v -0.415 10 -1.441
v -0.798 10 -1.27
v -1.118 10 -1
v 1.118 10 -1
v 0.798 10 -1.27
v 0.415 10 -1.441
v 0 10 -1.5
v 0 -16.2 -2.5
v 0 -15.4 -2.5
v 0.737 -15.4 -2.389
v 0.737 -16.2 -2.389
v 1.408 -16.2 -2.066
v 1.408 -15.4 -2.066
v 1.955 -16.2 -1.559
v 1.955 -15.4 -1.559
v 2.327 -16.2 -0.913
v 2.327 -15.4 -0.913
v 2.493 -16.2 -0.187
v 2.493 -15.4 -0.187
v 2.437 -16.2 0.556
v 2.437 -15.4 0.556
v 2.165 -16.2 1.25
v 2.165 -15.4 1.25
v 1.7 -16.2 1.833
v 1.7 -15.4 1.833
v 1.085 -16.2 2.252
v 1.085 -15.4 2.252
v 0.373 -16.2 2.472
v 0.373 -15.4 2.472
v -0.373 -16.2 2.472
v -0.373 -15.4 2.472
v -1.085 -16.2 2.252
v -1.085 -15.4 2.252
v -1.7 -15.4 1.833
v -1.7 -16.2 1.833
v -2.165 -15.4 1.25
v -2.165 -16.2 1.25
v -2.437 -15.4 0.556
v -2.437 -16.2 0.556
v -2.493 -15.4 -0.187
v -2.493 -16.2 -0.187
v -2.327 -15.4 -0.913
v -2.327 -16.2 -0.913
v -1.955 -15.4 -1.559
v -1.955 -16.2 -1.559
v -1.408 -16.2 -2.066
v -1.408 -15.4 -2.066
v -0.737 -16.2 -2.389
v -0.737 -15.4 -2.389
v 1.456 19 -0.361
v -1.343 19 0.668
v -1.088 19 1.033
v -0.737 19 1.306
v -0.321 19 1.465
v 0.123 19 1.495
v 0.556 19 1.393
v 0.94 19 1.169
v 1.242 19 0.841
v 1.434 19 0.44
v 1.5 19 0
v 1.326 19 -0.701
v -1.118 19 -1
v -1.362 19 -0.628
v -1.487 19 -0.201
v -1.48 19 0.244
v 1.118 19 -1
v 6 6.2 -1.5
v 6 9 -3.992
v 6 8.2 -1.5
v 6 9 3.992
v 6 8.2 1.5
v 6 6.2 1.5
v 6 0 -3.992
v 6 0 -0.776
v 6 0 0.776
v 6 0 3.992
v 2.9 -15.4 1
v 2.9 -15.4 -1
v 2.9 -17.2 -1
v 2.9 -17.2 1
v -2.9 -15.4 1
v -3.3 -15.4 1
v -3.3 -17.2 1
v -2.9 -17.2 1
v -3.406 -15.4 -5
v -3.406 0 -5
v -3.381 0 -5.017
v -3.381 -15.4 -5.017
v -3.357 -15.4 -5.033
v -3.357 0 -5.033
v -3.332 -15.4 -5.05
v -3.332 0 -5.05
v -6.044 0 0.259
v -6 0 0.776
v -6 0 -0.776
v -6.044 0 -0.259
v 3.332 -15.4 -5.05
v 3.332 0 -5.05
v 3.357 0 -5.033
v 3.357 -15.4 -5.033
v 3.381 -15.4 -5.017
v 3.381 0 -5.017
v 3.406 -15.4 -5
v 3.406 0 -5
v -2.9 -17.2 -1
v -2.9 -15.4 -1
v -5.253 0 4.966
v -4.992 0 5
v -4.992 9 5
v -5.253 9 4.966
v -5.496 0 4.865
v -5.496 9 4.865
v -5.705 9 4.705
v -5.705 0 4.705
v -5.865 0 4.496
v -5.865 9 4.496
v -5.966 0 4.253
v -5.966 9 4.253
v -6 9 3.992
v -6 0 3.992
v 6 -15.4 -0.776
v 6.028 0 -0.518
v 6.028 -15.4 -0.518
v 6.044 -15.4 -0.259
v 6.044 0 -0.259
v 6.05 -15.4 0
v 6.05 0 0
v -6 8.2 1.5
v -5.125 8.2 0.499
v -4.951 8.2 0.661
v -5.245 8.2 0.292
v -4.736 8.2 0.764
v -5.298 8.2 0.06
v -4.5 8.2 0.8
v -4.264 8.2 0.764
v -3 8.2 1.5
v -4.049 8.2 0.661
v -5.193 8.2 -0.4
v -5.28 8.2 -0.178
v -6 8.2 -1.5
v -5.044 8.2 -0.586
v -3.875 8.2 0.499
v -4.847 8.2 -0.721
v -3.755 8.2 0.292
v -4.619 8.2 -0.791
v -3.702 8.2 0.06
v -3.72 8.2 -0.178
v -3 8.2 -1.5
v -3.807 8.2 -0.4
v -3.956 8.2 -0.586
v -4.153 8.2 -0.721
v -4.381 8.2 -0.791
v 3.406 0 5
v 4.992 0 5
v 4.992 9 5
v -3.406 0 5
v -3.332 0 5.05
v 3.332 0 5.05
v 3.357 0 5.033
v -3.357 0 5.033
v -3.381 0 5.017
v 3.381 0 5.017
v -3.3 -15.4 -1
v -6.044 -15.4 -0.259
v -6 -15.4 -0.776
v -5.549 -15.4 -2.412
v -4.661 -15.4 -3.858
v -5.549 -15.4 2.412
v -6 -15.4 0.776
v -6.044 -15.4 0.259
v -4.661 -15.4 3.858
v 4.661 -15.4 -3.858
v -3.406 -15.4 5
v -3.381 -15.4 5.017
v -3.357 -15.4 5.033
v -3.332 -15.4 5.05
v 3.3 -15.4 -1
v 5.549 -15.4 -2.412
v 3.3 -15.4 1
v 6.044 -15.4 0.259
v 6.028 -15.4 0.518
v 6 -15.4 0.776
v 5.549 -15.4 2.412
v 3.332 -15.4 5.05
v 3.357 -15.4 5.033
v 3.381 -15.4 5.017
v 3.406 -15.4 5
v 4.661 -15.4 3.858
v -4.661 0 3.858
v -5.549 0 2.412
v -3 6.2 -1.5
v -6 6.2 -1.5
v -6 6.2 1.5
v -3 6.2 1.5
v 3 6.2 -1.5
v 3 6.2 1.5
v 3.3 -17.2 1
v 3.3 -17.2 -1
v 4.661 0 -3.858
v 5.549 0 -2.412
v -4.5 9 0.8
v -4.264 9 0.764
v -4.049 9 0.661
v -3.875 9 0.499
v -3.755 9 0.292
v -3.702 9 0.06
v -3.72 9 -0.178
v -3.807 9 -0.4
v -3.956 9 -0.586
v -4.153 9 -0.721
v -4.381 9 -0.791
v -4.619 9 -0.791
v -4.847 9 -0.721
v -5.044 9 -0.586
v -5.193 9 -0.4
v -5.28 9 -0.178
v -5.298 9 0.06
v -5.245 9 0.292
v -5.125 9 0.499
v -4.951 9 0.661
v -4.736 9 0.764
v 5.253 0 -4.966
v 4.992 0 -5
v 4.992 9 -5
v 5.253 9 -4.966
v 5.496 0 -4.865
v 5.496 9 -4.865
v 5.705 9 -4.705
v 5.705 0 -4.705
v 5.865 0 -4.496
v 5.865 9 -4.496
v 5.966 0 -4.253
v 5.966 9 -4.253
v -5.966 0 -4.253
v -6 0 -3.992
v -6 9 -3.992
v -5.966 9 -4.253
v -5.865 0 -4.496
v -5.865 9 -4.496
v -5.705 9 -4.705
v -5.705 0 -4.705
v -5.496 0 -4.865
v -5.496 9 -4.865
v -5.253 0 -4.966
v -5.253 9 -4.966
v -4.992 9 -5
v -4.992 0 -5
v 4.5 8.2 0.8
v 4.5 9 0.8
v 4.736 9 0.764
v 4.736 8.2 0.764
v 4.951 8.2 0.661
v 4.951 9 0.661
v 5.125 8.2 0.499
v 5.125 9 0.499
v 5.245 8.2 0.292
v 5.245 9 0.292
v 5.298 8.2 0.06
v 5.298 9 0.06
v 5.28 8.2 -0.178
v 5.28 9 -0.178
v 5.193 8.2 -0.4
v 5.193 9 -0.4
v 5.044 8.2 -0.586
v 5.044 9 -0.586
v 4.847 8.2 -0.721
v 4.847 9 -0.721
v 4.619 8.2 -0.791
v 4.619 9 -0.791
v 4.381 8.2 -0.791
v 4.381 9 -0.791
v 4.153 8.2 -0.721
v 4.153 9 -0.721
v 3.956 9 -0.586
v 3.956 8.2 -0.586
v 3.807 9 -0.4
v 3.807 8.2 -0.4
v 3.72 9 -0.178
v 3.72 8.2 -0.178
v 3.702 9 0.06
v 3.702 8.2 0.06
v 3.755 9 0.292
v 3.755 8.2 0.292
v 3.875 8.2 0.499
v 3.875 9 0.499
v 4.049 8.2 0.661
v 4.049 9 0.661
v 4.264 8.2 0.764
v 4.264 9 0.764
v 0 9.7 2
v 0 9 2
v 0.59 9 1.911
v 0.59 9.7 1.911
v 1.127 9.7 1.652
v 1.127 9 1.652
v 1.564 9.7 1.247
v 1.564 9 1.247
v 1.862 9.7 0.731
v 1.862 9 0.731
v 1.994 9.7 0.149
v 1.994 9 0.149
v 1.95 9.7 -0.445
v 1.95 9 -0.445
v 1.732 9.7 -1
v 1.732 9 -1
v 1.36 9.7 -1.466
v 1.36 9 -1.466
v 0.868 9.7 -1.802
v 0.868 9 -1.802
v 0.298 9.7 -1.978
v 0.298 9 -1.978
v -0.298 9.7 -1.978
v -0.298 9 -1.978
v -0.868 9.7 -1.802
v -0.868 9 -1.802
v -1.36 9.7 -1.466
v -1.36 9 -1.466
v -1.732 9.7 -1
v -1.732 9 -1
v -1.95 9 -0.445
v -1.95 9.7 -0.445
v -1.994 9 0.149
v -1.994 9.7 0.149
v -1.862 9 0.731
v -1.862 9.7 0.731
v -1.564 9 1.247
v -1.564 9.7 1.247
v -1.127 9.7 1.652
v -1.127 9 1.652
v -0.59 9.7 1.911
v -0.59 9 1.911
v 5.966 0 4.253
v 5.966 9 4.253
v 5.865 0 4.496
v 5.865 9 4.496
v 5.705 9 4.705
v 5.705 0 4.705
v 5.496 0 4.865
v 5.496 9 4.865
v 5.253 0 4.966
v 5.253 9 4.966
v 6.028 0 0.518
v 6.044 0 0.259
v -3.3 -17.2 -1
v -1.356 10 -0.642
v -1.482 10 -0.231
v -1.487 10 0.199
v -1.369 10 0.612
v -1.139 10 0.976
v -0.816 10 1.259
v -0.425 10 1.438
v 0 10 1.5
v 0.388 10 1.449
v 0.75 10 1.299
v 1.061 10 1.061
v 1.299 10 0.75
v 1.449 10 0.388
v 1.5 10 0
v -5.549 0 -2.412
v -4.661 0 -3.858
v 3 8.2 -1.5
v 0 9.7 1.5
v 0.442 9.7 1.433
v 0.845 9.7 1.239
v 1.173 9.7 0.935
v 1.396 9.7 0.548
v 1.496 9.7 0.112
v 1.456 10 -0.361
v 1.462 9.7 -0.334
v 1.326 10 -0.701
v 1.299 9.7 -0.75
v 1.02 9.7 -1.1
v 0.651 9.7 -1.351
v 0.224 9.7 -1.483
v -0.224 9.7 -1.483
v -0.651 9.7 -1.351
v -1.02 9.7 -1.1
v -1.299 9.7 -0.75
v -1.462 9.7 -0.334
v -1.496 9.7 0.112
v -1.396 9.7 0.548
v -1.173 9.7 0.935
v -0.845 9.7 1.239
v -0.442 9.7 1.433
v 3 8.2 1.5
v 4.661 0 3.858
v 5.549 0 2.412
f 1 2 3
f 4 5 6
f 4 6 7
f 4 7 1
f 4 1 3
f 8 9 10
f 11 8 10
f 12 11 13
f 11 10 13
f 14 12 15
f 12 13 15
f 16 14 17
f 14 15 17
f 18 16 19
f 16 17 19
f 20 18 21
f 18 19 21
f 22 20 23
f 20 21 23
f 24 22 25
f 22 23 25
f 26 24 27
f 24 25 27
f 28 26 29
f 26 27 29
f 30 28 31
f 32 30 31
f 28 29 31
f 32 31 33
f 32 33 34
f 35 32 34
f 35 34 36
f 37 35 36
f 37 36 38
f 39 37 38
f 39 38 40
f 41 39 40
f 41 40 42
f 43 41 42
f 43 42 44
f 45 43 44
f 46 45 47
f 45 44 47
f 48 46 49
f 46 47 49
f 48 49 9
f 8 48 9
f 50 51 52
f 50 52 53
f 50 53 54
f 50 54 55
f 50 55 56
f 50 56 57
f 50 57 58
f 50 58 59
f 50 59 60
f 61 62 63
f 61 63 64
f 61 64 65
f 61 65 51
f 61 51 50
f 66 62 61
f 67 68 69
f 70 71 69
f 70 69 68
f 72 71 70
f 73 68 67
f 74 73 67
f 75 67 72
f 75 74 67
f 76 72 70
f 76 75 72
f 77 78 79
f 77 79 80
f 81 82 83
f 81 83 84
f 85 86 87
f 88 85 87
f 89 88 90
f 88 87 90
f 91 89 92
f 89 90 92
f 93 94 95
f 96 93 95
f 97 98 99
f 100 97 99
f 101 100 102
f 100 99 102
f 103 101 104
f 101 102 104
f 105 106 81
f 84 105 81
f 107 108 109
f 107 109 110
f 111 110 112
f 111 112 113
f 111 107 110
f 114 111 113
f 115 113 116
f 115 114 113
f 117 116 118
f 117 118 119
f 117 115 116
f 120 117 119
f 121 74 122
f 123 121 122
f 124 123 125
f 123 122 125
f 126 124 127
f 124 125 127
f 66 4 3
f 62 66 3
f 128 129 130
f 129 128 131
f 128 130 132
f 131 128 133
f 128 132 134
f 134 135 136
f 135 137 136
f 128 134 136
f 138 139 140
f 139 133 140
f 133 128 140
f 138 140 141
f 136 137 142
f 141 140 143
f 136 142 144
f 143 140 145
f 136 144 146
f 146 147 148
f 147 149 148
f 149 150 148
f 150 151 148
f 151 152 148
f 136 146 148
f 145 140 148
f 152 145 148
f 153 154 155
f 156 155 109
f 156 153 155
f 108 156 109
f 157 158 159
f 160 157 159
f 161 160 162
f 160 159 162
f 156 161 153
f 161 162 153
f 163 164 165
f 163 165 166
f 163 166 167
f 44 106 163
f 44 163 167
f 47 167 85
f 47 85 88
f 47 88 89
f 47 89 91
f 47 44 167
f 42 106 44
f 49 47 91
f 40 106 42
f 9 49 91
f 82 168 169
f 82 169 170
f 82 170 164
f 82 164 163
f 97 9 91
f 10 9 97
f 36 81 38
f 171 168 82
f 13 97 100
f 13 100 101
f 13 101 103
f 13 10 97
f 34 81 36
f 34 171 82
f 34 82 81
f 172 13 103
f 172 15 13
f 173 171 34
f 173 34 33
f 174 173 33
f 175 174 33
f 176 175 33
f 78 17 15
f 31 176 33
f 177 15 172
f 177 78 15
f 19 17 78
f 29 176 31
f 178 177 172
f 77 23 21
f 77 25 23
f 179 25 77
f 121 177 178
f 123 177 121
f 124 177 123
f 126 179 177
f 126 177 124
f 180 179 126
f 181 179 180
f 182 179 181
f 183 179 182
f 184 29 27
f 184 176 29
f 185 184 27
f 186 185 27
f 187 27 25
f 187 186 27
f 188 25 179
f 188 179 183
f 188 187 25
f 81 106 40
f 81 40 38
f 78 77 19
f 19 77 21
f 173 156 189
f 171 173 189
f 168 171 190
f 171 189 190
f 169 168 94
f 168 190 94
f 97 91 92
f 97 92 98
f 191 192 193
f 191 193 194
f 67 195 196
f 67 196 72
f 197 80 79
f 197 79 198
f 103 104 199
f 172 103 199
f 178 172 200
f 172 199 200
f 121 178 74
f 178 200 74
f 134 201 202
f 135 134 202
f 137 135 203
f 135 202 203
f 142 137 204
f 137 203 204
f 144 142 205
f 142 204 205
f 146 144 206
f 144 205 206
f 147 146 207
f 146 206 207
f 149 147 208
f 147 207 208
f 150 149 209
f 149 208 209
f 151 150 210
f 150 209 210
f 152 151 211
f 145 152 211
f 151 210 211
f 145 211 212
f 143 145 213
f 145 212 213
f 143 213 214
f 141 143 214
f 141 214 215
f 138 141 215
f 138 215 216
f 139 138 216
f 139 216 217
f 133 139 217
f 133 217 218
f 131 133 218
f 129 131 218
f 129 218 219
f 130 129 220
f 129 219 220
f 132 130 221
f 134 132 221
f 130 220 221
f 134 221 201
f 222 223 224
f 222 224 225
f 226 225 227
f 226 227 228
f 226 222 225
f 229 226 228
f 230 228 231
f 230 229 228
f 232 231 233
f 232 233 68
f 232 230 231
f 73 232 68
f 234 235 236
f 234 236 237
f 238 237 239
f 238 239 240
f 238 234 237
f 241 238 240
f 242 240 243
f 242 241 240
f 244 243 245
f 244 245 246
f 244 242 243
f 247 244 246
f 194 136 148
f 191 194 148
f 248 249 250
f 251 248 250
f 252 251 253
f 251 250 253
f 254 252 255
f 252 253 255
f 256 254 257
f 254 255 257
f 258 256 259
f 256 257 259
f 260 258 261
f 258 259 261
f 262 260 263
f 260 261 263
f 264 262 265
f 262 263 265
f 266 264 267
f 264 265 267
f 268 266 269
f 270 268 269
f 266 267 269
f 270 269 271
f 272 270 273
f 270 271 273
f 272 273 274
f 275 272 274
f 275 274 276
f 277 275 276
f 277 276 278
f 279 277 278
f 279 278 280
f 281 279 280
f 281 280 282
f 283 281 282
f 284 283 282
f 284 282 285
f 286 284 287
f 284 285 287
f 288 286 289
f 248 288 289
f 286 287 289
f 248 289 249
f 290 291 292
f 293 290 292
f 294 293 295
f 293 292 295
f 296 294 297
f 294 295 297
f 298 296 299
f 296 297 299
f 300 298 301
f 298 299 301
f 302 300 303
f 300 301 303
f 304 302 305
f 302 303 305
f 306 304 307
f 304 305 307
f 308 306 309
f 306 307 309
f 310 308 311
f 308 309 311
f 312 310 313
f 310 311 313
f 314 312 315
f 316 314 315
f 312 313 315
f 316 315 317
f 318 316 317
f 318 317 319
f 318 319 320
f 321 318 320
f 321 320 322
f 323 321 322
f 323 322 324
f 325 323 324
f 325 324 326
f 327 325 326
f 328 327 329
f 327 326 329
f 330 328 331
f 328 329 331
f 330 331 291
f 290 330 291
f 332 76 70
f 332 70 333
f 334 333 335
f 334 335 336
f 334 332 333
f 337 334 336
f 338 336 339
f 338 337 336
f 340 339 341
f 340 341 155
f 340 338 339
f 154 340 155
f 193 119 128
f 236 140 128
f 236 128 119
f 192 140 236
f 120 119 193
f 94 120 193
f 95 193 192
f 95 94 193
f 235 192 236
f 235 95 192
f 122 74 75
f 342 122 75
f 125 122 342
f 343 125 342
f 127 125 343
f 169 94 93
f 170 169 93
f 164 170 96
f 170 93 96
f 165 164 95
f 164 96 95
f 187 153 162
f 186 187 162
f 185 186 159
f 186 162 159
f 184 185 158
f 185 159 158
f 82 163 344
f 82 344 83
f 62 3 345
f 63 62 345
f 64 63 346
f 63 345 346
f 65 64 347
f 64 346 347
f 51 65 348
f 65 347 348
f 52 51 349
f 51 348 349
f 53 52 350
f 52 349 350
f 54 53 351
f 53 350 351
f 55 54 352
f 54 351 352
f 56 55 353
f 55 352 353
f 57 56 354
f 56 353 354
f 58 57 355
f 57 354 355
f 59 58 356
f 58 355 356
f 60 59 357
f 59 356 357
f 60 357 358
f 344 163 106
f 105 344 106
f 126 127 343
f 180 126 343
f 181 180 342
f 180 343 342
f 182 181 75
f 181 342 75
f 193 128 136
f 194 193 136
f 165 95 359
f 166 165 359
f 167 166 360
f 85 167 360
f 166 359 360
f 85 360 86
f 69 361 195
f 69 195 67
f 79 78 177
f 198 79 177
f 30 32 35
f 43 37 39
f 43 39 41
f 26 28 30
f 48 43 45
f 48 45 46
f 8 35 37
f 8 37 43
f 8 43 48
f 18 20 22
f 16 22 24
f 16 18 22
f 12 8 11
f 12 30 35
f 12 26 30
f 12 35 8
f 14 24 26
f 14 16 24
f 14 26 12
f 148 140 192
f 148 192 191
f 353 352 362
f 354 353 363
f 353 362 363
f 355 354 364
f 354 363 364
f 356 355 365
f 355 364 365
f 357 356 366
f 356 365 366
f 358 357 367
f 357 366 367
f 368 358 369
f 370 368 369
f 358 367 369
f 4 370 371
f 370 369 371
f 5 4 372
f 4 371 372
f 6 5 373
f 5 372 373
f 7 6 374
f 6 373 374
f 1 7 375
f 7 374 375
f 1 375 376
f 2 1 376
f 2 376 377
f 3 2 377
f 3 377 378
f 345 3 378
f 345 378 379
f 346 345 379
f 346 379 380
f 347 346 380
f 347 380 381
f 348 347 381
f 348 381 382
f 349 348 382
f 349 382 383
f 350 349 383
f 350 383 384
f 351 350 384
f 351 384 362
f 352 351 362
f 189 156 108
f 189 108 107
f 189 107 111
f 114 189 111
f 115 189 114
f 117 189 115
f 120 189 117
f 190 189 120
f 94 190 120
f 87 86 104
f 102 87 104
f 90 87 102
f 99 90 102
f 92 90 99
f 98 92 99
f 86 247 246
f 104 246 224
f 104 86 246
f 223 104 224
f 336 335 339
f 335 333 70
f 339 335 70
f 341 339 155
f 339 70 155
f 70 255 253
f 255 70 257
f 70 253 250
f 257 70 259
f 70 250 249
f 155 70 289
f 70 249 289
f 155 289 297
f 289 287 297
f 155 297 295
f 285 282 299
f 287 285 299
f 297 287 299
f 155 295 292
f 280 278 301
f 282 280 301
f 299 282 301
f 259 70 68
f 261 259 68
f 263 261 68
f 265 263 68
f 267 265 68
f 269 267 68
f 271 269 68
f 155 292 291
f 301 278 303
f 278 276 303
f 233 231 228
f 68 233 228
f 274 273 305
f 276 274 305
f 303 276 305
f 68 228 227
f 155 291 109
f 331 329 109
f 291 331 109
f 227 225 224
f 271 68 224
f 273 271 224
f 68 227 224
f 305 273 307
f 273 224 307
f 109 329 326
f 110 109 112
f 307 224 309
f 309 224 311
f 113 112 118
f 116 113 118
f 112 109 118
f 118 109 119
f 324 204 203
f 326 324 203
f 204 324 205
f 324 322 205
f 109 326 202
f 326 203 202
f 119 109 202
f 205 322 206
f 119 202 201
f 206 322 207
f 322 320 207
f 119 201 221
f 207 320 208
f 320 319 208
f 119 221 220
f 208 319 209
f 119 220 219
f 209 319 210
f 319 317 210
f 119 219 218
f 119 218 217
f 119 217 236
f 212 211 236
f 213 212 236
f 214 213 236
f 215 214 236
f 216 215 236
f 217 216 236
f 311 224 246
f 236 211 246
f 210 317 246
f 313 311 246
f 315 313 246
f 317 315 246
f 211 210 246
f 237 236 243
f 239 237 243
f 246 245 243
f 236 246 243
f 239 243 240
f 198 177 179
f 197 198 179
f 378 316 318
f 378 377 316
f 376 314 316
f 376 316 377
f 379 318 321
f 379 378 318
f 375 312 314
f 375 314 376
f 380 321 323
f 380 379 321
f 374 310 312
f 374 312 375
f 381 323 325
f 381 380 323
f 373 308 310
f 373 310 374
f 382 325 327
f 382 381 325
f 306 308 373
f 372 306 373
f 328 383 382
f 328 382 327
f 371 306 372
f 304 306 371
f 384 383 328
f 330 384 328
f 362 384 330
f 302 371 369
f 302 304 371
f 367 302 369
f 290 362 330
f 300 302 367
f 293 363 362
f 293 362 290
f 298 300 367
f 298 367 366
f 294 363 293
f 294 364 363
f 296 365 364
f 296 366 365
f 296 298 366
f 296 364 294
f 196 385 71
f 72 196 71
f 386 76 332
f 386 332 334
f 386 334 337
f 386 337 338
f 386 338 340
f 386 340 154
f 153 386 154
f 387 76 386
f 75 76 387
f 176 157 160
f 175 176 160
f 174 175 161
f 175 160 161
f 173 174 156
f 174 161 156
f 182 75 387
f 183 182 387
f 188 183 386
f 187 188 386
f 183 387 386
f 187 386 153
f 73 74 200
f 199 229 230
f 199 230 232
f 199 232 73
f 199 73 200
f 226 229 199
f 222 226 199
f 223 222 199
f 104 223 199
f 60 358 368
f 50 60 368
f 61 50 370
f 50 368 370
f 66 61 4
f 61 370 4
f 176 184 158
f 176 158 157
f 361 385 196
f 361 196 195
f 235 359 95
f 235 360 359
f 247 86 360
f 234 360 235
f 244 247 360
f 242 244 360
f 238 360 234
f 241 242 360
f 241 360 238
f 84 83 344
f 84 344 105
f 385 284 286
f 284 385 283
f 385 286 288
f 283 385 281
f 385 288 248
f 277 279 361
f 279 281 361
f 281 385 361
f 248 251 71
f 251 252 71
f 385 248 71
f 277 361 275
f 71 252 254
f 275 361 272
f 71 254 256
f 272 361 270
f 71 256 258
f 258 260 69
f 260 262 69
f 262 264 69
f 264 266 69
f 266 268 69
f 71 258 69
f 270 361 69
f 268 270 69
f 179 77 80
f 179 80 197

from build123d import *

# Parameters (mm, degrees)
GEARBOX_DEPTH                            = 9
AXLE_MOUNT_HOLE_BASE_SKETCH_R            = 0.8
SCREW_HOLES_DEPTH                        = 0.8
SCREW_ROOM_BASE_W                        = 3
SCREW_ROOM_BASE_H                        = 3
SCREW_ROOM_DEPTH                         = 2
AXLE_MOUNT_HOLE_BASE_SKETCH_3_R          = 2
AXLE_BASE_DEPTH                          = 0.7
SKETCH4_R                                = 1.5
AXLE_NON_NOTCHED_DEPTH                   = 0.3
AXLE_NOTCHED_DEPTH                       = 9
MOTOR_DEPTH                              = 15.4
REAR_AXLE_BEARING_TERMINAL_BASE_SKETCH_R = 2.5
REAR_AXLE_BEARING_DEPTH                  = 0.8
REAR_AXLE_BEARING_TERMINAL_BASE_SK_2_W   = 0.4
REAR_AXLE_BEARING_TERMINAL_BASE_SK_2_H   = 2
TERMINALS_DEPTH                          = 1.8


with BuildPart() as part:
    # Gearbox base sketch → Gearbox (new body)
    with BuildSketch(Plane(origin=(0, 0, 0), x_dir=(1, 0, 0), z_dir=(0, 1, 0))):
        with BuildLine():
            Line((-4.992296279, 5), (4.992296279, 5))
            ThreePointArc((4.992296279, 5), (5.704850414, 4.704850414), (6, 3.992296279))
            Line((6, 3.992296279), (6, -3.992296279))
            ThreePointArc((6, -3.992296279), (5.704850414, -4.704850414), (4.992296279, -5))
            Line((4.992296279, -5), (-4.992296279, -5))
            ThreePointArc((-4.992296279, -5), (-5.704850414, -4.704850414), (-6, -3.992296279))
            Line((-6, -3.992296279), (-6, 3.992296279))
            ThreePointArc((-6, 3.992296279), (-5.704850414, 4.704850414), (-4.992296279, 5))
        make_face()
    extrude(amount=GEARBOX_DEPTH)

    # Axle & mount hole base sketch → Screw holes (cut)
    with BuildSketch(Plane(origin=(0, 9, 0), x_dir=(1, 0, 0), z_dir=(0, 1, 0))):
        with Locations((4.5, 0)):
            Circle(AXLE_MOUNT_HOLE_BASE_SKETCH_R)
        with Locations((-4.5, 0)):
            Circle(AXLE_MOUNT_HOLE_BASE_SKETCH_R)
    extrude(amount=-SCREW_HOLES_DEPTH, mode=Mode.SUBTRACT)

    # Screw room base → Screw room (cut)
    with BuildSketch(Plane(origin=(0, 8.2, 0), x_dir=(1, 0, 0), z_dir=(0, 1, 0))):
        with Locations((-4.5, 0)):
            Rectangle(SCREW_ROOM_BASE_W, SCREW_ROOM_BASE_H)
        with Locations((4.5, 0)):
            Rectangle(SCREW_ROOM_BASE_W, SCREW_ROOM_BASE_H)
    extrude(amount=-SCREW_ROOM_DEPTH, mode=Mode.SUBTRACT)

    # Axle & mount hole base sketch<3> → Axle base (add)
    with BuildSketch(Plane(origin=(0, 9, 0), x_dir=(1, 0, 0), z_dir=(0, 1, 0))):
        Circle(AXLE_MOUNT_HOLE_BASE_SKETCH_3_R)
    extrude(amount=AXLE_BASE_DEPTH)

    # Sketch4 → Axle non-notched (add)
    with BuildSketch(Plane(origin=(0, 9.7, 0), x_dir=(1, 0, 0), z_dir=(0, 1, 0))):
        Circle(SKETCH4_R)
    extrude(amount=AXLE_NON_NOTCHED_DEPTH)

    # Axle notched base sketch → Axle notched (add)
    with BuildSketch(Plane(origin=(0, 10, 0), x_dir=(1, 0, 0), z_dir=(0, 1, 0))):
        with BuildLine():
            Line((1.118033989, 1), (-1.118033989, 1))
            ThreePointArc((-1.118033989, 1), (-0.535233135, -1.401258538), (1.5, 0))
            ThreePointArc((1.5, 0), (1.401258538, 0.535233135), (1.118033989, 1))
        make_face()
    extrude(amount=AXLE_NOTCHED_DEPTH)

    # Motor base sketch → Motor (add)
    with BuildSketch(Plane.XZ):
        with BuildLine():
            Line((3.33166625, 5.05), (-3.33166625, 5.05))
            ThreePointArc((-3.33166625, 5.05), (-6.05, 0), (-3.33166625, -5.05))
            Line((-3.33166625, -5.05), (3.33166625, -5.05))
            ThreePointArc((3.33166625, -5.05), (6.05, 0), (3.33166625, 5.05))
        make_face()
    extrude(amount=MOTOR_DEPTH)

    # Rear axle bearing _ terminal base sketch → Rear axle bearing (add)
    with BuildSketch(Plane.XZ.offset(15.4)):
        Circle(REAR_AXLE_BEARING_TERMINAL_BASE_SKETCH_R)
    extrude(amount=REAR_AXLE_BEARING_DEPTH)

    # Rear axle bearing _ terminal base sk 2 → Terminals (add)
    with BuildSketch(Plane.XZ.offset(15.4)):
        with Locations((-3.1, 0)):
            Rectangle(REAR_AXLE_BEARING_TERMINAL_BASE_SK_2_W, REAR_AXLE_BEARING_TERMINAL_BASE_SK_2_H)
        with Locations((3.1, 0)):
            Rectangle(REAR_AXLE_BEARING_TERMINAL_BASE_SK_2_W, REAR_AXLE_BEARING_TERMINAL_BASE_SK_2_H)
    extrude(amount=TERMINALS_DEPTH)


solid = part.part
